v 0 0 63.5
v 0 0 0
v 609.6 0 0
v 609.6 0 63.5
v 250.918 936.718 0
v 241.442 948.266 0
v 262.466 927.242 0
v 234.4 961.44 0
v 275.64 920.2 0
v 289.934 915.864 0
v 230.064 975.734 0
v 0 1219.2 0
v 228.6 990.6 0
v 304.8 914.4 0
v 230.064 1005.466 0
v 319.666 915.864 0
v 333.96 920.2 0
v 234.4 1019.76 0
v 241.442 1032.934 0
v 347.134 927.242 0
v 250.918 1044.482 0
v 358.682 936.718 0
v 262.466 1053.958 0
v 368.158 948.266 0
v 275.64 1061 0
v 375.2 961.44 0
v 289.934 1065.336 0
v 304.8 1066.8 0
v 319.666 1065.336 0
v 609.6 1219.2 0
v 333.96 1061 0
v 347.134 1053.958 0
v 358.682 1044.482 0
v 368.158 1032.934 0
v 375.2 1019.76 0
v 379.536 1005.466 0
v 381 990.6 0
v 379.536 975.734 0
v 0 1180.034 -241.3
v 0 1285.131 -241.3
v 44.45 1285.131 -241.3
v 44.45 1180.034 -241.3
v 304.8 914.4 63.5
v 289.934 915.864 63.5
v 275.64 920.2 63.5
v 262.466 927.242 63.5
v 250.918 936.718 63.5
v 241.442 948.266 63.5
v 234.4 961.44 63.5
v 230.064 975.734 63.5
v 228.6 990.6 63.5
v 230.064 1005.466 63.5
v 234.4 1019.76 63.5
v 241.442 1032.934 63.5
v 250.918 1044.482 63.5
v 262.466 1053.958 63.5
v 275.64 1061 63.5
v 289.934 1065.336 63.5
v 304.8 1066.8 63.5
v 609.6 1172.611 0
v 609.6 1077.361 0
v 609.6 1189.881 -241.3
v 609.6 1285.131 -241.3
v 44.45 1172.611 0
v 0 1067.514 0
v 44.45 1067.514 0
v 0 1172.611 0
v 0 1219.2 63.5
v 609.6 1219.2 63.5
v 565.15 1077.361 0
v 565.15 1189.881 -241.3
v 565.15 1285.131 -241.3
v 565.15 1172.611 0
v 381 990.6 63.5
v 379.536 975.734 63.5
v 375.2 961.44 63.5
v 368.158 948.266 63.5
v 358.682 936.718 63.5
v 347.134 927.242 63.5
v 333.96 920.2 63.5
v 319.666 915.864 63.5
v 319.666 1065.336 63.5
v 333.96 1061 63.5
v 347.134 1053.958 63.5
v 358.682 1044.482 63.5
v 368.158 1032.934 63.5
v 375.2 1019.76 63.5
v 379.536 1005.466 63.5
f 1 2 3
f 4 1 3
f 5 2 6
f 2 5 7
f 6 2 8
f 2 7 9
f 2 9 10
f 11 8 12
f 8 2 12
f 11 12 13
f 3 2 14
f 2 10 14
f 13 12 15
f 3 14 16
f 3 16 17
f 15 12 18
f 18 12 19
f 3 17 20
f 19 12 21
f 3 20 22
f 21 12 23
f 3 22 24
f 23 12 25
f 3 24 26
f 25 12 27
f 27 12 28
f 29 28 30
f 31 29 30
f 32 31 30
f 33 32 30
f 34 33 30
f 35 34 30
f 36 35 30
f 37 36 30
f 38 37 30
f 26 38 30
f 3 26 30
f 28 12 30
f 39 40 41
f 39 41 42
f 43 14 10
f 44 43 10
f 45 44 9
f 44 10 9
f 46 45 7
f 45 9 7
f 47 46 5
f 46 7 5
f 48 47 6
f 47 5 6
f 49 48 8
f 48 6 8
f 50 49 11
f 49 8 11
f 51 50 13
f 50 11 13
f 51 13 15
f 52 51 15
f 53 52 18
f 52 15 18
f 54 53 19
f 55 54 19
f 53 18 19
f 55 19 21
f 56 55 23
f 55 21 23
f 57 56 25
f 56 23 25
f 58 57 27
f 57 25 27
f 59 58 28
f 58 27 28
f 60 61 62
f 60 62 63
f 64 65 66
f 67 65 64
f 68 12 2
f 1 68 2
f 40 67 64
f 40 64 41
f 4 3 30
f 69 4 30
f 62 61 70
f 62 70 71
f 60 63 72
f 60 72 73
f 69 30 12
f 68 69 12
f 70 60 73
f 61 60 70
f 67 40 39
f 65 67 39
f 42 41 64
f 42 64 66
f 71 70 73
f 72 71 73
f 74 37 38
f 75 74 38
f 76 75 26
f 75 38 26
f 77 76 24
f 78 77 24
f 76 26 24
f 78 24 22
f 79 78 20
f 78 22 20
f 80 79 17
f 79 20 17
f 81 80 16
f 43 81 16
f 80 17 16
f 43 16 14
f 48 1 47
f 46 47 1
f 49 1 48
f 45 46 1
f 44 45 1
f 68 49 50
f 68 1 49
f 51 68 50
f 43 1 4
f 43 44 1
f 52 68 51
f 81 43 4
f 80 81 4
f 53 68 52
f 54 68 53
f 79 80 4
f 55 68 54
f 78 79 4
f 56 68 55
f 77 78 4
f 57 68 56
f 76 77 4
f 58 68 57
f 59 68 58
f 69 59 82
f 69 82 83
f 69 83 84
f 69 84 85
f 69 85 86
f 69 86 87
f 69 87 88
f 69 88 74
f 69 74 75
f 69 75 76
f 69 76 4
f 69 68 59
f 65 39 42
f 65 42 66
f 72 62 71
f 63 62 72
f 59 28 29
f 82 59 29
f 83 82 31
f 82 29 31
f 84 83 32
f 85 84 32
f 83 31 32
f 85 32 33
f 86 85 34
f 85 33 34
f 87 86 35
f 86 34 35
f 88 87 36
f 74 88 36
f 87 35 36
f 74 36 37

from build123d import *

# Parameters (mm, degrees)
F1_DEPTH = 63.5
F3_DEPTH = 44.45
F5_DEPTH = 44.45


with BuildPart() as f1:
    # F0 (on Top) → F1 (new body)
    with BuildSketch(Plane.XY):
        with BuildLine():
            Line((0, 1219.2), (0, 990.6))
            Line((0, 990.6), (228.6, 990.6))
            ThreePointArc((228.6, 990.6), (250.918463, 1044.481537), (304.8, 1066.8))
            Line((304.8, 1066.8), (304.8, 1219.2))
            Line((304.8, 1219.2), (0, 1219.2))
        make_face()
        with BuildLine():
            Line((381, 990.6), (609.6, 990.6))
            Line((609.6, 990.6), (609.6, 1219.2))
            Line((609.6, 1219.2), (304.8, 1219.2))
            Line((304.8, 1219.2), (304.8, 1066.8))
            ThreePointArc((304.8, 1066.8), (358.681537, 1044.481537), (381, 990.6))
        make_face()
        with BuildLine():
            Line((304.8, 914.4), (304.8, 0))
            Line((304.8, 0), (609.6, 0))
            Line((609.6, 0), (609.6, 990.6))
            Line((609.6, 990.6), (381, 990.6))
            ThreePointArc((381, 990.6), (358.681537, 936.718463), (304.8, 914.4))
        make_face()
        with BuildLine():
            Line((0, 990.6), (0, 0))
            Line((0, 0), (304.8, 0))
            Line((304.8, 0), (304.8, 914.4))
            ThreePointArc((304.8, 914.4), (250.918463, 936.718463), (228.6, 990.6))
            Line((228.6, 990.6), (0, 990.6))
        make_face()
    extrude(amount=F1_DEPTH)


with BuildPart() as f3:
    # F2 (on face) → F3 (new body)
    with BuildSketch(Plane(origin=(0, 0, 0), x_dir=(0, -1, 0), z_dir=(-1, 0, 0))):
        Polygon((-1067.51379, 0), (-1172.610536, 0), (-1285.130574, -241.3), (-1180.033827, -241.3), align=None)
    extrude(amount=-F3_DEPTH)


with BuildPart() as f5:
    # F4 (on face) → F5 (new body)
    with BuildSketch(Plane.YZ.offset(609.6)):
        Polygon((1172.610536, 0), (1077.360536, 0), (1189.880574, -241.3), (1285.130574, -241.3), align=None)
    extrude(amount=-F5_DEPTH)


solid = Compound([f1.part, f3.part, f5.part])
